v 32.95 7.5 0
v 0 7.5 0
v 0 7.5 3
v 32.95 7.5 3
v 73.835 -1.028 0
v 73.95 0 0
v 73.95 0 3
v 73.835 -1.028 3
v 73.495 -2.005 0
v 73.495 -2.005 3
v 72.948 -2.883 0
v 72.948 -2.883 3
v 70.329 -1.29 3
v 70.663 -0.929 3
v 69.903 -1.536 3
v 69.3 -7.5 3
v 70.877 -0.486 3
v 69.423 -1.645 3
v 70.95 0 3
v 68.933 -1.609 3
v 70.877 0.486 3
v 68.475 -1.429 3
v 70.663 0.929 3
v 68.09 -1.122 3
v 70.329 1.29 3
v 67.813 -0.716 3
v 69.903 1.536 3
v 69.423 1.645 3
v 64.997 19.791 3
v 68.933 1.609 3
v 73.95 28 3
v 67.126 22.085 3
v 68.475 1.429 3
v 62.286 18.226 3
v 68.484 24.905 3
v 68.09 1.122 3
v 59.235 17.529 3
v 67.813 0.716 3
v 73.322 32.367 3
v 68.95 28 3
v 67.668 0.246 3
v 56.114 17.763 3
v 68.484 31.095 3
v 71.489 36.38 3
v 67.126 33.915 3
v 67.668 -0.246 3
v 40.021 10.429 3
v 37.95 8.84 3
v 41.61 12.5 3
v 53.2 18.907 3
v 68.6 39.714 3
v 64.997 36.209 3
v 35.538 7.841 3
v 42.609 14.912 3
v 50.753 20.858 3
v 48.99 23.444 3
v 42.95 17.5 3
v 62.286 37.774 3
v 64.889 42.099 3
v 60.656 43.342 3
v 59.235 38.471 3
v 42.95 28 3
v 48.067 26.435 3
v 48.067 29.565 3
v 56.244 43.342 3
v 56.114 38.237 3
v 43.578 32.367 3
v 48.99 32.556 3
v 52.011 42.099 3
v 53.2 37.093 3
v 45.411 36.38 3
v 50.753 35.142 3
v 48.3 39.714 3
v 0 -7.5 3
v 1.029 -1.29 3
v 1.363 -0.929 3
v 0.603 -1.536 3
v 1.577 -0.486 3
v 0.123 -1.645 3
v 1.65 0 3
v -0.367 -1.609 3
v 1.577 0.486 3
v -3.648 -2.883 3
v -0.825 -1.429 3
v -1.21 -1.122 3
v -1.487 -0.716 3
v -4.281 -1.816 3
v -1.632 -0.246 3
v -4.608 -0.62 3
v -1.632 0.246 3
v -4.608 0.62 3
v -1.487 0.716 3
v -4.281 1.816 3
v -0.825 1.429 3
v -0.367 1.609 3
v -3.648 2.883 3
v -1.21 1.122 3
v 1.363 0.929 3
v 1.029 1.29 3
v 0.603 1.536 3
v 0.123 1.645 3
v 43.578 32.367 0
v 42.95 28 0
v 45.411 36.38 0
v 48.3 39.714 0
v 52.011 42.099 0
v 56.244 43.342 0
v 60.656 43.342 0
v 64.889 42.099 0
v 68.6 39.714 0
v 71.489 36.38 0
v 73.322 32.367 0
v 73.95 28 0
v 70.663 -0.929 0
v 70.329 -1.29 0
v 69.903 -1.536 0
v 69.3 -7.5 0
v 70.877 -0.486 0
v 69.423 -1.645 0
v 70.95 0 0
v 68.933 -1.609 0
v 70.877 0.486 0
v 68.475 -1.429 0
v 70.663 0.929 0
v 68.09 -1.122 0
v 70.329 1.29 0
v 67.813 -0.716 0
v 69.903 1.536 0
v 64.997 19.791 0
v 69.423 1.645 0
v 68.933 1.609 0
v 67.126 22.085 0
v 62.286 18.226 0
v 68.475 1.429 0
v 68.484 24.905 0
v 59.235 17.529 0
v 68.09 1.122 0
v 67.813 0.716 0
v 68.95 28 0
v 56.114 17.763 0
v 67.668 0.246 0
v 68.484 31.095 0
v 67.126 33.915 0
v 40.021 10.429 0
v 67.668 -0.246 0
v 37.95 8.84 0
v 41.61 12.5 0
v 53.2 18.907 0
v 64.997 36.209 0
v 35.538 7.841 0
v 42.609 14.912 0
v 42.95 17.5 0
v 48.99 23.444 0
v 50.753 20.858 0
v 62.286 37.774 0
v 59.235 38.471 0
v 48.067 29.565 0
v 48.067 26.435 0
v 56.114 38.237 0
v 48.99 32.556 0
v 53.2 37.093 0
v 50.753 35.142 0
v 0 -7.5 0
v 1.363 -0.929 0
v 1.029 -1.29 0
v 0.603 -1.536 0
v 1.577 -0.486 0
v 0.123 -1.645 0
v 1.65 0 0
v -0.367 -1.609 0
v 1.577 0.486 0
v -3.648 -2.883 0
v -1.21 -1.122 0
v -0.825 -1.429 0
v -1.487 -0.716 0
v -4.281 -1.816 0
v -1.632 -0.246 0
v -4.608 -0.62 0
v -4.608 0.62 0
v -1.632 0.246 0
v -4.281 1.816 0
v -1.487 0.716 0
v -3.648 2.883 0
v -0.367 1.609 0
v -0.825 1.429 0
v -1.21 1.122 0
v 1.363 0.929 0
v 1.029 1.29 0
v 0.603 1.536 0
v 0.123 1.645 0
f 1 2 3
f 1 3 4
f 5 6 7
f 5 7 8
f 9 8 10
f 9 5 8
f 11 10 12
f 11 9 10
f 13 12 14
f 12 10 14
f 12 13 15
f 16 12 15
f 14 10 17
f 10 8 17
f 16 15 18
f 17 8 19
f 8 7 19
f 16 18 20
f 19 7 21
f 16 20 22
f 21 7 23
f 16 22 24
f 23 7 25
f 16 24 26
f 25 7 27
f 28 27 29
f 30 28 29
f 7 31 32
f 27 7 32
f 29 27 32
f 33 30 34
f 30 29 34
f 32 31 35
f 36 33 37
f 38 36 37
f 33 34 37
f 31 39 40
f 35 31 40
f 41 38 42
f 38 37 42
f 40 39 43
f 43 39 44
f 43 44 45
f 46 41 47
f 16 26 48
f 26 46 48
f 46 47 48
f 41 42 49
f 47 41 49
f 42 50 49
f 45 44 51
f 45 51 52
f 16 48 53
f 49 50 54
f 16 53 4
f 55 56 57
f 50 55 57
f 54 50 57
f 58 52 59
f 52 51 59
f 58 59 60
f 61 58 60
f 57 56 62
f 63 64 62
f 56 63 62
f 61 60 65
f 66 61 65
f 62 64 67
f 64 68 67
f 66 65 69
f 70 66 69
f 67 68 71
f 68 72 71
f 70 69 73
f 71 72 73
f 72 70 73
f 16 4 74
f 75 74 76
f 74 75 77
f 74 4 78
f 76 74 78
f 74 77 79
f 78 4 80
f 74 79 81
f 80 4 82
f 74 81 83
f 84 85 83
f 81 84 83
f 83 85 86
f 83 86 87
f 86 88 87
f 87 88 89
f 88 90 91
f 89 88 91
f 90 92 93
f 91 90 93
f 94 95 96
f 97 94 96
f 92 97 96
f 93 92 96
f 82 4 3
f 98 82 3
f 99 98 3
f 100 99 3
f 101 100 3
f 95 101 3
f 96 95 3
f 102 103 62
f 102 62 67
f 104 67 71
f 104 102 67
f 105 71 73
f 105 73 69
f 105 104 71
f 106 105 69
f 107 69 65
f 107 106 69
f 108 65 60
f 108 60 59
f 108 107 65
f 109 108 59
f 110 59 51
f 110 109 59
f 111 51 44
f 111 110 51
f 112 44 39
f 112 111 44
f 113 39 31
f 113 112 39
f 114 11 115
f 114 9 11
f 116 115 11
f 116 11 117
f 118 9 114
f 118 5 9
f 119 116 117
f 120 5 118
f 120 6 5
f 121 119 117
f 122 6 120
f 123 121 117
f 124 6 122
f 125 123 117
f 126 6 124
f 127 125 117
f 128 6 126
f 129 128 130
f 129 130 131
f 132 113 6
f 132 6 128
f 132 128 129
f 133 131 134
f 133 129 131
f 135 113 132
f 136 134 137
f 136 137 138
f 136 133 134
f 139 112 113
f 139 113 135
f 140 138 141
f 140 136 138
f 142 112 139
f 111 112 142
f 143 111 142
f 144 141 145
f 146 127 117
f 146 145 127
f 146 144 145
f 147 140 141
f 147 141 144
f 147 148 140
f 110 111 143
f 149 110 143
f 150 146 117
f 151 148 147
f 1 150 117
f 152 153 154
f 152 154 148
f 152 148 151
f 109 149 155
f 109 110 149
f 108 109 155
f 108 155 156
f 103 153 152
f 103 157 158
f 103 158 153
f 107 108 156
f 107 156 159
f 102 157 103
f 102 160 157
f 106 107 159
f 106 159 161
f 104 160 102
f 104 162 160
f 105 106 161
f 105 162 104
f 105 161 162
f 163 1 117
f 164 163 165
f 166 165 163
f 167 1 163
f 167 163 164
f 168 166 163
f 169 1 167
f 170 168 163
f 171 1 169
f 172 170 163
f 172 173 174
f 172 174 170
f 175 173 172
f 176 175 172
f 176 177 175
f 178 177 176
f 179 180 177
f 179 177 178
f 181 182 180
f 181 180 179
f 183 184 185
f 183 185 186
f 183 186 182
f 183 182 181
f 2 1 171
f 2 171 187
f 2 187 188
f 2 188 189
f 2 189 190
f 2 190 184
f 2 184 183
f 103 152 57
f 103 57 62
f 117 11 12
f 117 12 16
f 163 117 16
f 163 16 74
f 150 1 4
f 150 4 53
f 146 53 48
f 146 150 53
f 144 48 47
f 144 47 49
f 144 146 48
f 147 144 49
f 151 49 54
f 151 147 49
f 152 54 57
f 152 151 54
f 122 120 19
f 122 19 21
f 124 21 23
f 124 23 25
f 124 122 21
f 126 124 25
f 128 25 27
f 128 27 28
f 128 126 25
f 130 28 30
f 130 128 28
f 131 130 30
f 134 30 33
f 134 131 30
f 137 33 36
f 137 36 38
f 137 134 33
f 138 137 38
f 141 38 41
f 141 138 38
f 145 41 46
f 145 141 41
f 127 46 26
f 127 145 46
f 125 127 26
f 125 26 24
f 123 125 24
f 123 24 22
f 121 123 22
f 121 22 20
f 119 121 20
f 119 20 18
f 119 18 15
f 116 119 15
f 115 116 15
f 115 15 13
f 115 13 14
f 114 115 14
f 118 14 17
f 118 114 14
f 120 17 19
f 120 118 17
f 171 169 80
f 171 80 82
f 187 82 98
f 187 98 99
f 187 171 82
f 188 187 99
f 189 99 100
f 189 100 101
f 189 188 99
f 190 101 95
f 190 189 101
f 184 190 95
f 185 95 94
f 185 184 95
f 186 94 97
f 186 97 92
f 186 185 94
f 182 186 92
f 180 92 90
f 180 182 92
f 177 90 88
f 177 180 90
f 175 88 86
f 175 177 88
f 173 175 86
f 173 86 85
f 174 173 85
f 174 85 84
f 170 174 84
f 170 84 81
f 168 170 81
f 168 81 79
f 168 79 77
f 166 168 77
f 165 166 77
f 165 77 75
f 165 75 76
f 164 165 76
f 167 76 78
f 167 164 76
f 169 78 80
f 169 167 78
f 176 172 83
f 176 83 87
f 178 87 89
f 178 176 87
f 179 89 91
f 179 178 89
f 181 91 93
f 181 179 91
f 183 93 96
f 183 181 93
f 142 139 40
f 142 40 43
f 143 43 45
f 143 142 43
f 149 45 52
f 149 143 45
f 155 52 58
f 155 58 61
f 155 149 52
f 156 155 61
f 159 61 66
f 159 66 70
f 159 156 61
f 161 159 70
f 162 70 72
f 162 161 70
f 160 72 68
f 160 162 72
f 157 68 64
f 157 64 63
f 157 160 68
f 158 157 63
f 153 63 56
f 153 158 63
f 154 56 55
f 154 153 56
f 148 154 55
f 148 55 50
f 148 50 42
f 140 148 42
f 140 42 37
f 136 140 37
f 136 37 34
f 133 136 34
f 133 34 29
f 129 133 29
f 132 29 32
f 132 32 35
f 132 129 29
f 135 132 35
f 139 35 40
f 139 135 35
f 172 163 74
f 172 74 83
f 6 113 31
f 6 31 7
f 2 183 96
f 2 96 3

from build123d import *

# Parameters (mm, degrees)
SKETCH1_R           = 1.65
SKETCH1_R_2         = 10.5
BOSS_EXTRUDE1_DEPTH = 3


with BuildPart() as part:
    # Sketch1 → Boss-Extrude1 (new body)
    with BuildSketch(Plane.XY):
        with BuildLine():
            Line((0, 7.5), (32.95, 7.5))
            ThreePointArc((32.95, 7.5), (40.021067812, 10.428932188), (42.95, 17.5))
            Line((42.95, 17.5), (42.95, 28))
            ThreePointArc((42.95, 28), (58.45, 43.5), (73.95, 28))
            Line((73.95, 28), (73.95, 0))
            ThreePointArc((73.95, 0), (73.692468135, -1.526015624), (72.948398416, -2.883))
            Line((72.948398416, -2.883), (69.3, -7.5))
            Line((69.3, -7.5), (0, -7.5))
            Line((0, -7.5), (-3.648398416, -2.883))
            ThreePointArc((-3.648398416, -2.883), (-4.65, 0), (-3.648398416, 2.883))
            Line((-3.648398416, 2.883), (0, 7.5))
        make_face()
        Circle(SKETCH1_R, mode=Mode.SUBTRACT)
        with Locations((69.3, 0)):
            Circle(SKETCH1_R, mode=Mode.SUBTRACT)
        with Locations((58.45, 28)):
            Circle(SKETCH1_R_2, mode=Mode.SUBTRACT)
    extrude(amount=BOSS_EXTRUDE1_DEPTH)


solid = part.part
